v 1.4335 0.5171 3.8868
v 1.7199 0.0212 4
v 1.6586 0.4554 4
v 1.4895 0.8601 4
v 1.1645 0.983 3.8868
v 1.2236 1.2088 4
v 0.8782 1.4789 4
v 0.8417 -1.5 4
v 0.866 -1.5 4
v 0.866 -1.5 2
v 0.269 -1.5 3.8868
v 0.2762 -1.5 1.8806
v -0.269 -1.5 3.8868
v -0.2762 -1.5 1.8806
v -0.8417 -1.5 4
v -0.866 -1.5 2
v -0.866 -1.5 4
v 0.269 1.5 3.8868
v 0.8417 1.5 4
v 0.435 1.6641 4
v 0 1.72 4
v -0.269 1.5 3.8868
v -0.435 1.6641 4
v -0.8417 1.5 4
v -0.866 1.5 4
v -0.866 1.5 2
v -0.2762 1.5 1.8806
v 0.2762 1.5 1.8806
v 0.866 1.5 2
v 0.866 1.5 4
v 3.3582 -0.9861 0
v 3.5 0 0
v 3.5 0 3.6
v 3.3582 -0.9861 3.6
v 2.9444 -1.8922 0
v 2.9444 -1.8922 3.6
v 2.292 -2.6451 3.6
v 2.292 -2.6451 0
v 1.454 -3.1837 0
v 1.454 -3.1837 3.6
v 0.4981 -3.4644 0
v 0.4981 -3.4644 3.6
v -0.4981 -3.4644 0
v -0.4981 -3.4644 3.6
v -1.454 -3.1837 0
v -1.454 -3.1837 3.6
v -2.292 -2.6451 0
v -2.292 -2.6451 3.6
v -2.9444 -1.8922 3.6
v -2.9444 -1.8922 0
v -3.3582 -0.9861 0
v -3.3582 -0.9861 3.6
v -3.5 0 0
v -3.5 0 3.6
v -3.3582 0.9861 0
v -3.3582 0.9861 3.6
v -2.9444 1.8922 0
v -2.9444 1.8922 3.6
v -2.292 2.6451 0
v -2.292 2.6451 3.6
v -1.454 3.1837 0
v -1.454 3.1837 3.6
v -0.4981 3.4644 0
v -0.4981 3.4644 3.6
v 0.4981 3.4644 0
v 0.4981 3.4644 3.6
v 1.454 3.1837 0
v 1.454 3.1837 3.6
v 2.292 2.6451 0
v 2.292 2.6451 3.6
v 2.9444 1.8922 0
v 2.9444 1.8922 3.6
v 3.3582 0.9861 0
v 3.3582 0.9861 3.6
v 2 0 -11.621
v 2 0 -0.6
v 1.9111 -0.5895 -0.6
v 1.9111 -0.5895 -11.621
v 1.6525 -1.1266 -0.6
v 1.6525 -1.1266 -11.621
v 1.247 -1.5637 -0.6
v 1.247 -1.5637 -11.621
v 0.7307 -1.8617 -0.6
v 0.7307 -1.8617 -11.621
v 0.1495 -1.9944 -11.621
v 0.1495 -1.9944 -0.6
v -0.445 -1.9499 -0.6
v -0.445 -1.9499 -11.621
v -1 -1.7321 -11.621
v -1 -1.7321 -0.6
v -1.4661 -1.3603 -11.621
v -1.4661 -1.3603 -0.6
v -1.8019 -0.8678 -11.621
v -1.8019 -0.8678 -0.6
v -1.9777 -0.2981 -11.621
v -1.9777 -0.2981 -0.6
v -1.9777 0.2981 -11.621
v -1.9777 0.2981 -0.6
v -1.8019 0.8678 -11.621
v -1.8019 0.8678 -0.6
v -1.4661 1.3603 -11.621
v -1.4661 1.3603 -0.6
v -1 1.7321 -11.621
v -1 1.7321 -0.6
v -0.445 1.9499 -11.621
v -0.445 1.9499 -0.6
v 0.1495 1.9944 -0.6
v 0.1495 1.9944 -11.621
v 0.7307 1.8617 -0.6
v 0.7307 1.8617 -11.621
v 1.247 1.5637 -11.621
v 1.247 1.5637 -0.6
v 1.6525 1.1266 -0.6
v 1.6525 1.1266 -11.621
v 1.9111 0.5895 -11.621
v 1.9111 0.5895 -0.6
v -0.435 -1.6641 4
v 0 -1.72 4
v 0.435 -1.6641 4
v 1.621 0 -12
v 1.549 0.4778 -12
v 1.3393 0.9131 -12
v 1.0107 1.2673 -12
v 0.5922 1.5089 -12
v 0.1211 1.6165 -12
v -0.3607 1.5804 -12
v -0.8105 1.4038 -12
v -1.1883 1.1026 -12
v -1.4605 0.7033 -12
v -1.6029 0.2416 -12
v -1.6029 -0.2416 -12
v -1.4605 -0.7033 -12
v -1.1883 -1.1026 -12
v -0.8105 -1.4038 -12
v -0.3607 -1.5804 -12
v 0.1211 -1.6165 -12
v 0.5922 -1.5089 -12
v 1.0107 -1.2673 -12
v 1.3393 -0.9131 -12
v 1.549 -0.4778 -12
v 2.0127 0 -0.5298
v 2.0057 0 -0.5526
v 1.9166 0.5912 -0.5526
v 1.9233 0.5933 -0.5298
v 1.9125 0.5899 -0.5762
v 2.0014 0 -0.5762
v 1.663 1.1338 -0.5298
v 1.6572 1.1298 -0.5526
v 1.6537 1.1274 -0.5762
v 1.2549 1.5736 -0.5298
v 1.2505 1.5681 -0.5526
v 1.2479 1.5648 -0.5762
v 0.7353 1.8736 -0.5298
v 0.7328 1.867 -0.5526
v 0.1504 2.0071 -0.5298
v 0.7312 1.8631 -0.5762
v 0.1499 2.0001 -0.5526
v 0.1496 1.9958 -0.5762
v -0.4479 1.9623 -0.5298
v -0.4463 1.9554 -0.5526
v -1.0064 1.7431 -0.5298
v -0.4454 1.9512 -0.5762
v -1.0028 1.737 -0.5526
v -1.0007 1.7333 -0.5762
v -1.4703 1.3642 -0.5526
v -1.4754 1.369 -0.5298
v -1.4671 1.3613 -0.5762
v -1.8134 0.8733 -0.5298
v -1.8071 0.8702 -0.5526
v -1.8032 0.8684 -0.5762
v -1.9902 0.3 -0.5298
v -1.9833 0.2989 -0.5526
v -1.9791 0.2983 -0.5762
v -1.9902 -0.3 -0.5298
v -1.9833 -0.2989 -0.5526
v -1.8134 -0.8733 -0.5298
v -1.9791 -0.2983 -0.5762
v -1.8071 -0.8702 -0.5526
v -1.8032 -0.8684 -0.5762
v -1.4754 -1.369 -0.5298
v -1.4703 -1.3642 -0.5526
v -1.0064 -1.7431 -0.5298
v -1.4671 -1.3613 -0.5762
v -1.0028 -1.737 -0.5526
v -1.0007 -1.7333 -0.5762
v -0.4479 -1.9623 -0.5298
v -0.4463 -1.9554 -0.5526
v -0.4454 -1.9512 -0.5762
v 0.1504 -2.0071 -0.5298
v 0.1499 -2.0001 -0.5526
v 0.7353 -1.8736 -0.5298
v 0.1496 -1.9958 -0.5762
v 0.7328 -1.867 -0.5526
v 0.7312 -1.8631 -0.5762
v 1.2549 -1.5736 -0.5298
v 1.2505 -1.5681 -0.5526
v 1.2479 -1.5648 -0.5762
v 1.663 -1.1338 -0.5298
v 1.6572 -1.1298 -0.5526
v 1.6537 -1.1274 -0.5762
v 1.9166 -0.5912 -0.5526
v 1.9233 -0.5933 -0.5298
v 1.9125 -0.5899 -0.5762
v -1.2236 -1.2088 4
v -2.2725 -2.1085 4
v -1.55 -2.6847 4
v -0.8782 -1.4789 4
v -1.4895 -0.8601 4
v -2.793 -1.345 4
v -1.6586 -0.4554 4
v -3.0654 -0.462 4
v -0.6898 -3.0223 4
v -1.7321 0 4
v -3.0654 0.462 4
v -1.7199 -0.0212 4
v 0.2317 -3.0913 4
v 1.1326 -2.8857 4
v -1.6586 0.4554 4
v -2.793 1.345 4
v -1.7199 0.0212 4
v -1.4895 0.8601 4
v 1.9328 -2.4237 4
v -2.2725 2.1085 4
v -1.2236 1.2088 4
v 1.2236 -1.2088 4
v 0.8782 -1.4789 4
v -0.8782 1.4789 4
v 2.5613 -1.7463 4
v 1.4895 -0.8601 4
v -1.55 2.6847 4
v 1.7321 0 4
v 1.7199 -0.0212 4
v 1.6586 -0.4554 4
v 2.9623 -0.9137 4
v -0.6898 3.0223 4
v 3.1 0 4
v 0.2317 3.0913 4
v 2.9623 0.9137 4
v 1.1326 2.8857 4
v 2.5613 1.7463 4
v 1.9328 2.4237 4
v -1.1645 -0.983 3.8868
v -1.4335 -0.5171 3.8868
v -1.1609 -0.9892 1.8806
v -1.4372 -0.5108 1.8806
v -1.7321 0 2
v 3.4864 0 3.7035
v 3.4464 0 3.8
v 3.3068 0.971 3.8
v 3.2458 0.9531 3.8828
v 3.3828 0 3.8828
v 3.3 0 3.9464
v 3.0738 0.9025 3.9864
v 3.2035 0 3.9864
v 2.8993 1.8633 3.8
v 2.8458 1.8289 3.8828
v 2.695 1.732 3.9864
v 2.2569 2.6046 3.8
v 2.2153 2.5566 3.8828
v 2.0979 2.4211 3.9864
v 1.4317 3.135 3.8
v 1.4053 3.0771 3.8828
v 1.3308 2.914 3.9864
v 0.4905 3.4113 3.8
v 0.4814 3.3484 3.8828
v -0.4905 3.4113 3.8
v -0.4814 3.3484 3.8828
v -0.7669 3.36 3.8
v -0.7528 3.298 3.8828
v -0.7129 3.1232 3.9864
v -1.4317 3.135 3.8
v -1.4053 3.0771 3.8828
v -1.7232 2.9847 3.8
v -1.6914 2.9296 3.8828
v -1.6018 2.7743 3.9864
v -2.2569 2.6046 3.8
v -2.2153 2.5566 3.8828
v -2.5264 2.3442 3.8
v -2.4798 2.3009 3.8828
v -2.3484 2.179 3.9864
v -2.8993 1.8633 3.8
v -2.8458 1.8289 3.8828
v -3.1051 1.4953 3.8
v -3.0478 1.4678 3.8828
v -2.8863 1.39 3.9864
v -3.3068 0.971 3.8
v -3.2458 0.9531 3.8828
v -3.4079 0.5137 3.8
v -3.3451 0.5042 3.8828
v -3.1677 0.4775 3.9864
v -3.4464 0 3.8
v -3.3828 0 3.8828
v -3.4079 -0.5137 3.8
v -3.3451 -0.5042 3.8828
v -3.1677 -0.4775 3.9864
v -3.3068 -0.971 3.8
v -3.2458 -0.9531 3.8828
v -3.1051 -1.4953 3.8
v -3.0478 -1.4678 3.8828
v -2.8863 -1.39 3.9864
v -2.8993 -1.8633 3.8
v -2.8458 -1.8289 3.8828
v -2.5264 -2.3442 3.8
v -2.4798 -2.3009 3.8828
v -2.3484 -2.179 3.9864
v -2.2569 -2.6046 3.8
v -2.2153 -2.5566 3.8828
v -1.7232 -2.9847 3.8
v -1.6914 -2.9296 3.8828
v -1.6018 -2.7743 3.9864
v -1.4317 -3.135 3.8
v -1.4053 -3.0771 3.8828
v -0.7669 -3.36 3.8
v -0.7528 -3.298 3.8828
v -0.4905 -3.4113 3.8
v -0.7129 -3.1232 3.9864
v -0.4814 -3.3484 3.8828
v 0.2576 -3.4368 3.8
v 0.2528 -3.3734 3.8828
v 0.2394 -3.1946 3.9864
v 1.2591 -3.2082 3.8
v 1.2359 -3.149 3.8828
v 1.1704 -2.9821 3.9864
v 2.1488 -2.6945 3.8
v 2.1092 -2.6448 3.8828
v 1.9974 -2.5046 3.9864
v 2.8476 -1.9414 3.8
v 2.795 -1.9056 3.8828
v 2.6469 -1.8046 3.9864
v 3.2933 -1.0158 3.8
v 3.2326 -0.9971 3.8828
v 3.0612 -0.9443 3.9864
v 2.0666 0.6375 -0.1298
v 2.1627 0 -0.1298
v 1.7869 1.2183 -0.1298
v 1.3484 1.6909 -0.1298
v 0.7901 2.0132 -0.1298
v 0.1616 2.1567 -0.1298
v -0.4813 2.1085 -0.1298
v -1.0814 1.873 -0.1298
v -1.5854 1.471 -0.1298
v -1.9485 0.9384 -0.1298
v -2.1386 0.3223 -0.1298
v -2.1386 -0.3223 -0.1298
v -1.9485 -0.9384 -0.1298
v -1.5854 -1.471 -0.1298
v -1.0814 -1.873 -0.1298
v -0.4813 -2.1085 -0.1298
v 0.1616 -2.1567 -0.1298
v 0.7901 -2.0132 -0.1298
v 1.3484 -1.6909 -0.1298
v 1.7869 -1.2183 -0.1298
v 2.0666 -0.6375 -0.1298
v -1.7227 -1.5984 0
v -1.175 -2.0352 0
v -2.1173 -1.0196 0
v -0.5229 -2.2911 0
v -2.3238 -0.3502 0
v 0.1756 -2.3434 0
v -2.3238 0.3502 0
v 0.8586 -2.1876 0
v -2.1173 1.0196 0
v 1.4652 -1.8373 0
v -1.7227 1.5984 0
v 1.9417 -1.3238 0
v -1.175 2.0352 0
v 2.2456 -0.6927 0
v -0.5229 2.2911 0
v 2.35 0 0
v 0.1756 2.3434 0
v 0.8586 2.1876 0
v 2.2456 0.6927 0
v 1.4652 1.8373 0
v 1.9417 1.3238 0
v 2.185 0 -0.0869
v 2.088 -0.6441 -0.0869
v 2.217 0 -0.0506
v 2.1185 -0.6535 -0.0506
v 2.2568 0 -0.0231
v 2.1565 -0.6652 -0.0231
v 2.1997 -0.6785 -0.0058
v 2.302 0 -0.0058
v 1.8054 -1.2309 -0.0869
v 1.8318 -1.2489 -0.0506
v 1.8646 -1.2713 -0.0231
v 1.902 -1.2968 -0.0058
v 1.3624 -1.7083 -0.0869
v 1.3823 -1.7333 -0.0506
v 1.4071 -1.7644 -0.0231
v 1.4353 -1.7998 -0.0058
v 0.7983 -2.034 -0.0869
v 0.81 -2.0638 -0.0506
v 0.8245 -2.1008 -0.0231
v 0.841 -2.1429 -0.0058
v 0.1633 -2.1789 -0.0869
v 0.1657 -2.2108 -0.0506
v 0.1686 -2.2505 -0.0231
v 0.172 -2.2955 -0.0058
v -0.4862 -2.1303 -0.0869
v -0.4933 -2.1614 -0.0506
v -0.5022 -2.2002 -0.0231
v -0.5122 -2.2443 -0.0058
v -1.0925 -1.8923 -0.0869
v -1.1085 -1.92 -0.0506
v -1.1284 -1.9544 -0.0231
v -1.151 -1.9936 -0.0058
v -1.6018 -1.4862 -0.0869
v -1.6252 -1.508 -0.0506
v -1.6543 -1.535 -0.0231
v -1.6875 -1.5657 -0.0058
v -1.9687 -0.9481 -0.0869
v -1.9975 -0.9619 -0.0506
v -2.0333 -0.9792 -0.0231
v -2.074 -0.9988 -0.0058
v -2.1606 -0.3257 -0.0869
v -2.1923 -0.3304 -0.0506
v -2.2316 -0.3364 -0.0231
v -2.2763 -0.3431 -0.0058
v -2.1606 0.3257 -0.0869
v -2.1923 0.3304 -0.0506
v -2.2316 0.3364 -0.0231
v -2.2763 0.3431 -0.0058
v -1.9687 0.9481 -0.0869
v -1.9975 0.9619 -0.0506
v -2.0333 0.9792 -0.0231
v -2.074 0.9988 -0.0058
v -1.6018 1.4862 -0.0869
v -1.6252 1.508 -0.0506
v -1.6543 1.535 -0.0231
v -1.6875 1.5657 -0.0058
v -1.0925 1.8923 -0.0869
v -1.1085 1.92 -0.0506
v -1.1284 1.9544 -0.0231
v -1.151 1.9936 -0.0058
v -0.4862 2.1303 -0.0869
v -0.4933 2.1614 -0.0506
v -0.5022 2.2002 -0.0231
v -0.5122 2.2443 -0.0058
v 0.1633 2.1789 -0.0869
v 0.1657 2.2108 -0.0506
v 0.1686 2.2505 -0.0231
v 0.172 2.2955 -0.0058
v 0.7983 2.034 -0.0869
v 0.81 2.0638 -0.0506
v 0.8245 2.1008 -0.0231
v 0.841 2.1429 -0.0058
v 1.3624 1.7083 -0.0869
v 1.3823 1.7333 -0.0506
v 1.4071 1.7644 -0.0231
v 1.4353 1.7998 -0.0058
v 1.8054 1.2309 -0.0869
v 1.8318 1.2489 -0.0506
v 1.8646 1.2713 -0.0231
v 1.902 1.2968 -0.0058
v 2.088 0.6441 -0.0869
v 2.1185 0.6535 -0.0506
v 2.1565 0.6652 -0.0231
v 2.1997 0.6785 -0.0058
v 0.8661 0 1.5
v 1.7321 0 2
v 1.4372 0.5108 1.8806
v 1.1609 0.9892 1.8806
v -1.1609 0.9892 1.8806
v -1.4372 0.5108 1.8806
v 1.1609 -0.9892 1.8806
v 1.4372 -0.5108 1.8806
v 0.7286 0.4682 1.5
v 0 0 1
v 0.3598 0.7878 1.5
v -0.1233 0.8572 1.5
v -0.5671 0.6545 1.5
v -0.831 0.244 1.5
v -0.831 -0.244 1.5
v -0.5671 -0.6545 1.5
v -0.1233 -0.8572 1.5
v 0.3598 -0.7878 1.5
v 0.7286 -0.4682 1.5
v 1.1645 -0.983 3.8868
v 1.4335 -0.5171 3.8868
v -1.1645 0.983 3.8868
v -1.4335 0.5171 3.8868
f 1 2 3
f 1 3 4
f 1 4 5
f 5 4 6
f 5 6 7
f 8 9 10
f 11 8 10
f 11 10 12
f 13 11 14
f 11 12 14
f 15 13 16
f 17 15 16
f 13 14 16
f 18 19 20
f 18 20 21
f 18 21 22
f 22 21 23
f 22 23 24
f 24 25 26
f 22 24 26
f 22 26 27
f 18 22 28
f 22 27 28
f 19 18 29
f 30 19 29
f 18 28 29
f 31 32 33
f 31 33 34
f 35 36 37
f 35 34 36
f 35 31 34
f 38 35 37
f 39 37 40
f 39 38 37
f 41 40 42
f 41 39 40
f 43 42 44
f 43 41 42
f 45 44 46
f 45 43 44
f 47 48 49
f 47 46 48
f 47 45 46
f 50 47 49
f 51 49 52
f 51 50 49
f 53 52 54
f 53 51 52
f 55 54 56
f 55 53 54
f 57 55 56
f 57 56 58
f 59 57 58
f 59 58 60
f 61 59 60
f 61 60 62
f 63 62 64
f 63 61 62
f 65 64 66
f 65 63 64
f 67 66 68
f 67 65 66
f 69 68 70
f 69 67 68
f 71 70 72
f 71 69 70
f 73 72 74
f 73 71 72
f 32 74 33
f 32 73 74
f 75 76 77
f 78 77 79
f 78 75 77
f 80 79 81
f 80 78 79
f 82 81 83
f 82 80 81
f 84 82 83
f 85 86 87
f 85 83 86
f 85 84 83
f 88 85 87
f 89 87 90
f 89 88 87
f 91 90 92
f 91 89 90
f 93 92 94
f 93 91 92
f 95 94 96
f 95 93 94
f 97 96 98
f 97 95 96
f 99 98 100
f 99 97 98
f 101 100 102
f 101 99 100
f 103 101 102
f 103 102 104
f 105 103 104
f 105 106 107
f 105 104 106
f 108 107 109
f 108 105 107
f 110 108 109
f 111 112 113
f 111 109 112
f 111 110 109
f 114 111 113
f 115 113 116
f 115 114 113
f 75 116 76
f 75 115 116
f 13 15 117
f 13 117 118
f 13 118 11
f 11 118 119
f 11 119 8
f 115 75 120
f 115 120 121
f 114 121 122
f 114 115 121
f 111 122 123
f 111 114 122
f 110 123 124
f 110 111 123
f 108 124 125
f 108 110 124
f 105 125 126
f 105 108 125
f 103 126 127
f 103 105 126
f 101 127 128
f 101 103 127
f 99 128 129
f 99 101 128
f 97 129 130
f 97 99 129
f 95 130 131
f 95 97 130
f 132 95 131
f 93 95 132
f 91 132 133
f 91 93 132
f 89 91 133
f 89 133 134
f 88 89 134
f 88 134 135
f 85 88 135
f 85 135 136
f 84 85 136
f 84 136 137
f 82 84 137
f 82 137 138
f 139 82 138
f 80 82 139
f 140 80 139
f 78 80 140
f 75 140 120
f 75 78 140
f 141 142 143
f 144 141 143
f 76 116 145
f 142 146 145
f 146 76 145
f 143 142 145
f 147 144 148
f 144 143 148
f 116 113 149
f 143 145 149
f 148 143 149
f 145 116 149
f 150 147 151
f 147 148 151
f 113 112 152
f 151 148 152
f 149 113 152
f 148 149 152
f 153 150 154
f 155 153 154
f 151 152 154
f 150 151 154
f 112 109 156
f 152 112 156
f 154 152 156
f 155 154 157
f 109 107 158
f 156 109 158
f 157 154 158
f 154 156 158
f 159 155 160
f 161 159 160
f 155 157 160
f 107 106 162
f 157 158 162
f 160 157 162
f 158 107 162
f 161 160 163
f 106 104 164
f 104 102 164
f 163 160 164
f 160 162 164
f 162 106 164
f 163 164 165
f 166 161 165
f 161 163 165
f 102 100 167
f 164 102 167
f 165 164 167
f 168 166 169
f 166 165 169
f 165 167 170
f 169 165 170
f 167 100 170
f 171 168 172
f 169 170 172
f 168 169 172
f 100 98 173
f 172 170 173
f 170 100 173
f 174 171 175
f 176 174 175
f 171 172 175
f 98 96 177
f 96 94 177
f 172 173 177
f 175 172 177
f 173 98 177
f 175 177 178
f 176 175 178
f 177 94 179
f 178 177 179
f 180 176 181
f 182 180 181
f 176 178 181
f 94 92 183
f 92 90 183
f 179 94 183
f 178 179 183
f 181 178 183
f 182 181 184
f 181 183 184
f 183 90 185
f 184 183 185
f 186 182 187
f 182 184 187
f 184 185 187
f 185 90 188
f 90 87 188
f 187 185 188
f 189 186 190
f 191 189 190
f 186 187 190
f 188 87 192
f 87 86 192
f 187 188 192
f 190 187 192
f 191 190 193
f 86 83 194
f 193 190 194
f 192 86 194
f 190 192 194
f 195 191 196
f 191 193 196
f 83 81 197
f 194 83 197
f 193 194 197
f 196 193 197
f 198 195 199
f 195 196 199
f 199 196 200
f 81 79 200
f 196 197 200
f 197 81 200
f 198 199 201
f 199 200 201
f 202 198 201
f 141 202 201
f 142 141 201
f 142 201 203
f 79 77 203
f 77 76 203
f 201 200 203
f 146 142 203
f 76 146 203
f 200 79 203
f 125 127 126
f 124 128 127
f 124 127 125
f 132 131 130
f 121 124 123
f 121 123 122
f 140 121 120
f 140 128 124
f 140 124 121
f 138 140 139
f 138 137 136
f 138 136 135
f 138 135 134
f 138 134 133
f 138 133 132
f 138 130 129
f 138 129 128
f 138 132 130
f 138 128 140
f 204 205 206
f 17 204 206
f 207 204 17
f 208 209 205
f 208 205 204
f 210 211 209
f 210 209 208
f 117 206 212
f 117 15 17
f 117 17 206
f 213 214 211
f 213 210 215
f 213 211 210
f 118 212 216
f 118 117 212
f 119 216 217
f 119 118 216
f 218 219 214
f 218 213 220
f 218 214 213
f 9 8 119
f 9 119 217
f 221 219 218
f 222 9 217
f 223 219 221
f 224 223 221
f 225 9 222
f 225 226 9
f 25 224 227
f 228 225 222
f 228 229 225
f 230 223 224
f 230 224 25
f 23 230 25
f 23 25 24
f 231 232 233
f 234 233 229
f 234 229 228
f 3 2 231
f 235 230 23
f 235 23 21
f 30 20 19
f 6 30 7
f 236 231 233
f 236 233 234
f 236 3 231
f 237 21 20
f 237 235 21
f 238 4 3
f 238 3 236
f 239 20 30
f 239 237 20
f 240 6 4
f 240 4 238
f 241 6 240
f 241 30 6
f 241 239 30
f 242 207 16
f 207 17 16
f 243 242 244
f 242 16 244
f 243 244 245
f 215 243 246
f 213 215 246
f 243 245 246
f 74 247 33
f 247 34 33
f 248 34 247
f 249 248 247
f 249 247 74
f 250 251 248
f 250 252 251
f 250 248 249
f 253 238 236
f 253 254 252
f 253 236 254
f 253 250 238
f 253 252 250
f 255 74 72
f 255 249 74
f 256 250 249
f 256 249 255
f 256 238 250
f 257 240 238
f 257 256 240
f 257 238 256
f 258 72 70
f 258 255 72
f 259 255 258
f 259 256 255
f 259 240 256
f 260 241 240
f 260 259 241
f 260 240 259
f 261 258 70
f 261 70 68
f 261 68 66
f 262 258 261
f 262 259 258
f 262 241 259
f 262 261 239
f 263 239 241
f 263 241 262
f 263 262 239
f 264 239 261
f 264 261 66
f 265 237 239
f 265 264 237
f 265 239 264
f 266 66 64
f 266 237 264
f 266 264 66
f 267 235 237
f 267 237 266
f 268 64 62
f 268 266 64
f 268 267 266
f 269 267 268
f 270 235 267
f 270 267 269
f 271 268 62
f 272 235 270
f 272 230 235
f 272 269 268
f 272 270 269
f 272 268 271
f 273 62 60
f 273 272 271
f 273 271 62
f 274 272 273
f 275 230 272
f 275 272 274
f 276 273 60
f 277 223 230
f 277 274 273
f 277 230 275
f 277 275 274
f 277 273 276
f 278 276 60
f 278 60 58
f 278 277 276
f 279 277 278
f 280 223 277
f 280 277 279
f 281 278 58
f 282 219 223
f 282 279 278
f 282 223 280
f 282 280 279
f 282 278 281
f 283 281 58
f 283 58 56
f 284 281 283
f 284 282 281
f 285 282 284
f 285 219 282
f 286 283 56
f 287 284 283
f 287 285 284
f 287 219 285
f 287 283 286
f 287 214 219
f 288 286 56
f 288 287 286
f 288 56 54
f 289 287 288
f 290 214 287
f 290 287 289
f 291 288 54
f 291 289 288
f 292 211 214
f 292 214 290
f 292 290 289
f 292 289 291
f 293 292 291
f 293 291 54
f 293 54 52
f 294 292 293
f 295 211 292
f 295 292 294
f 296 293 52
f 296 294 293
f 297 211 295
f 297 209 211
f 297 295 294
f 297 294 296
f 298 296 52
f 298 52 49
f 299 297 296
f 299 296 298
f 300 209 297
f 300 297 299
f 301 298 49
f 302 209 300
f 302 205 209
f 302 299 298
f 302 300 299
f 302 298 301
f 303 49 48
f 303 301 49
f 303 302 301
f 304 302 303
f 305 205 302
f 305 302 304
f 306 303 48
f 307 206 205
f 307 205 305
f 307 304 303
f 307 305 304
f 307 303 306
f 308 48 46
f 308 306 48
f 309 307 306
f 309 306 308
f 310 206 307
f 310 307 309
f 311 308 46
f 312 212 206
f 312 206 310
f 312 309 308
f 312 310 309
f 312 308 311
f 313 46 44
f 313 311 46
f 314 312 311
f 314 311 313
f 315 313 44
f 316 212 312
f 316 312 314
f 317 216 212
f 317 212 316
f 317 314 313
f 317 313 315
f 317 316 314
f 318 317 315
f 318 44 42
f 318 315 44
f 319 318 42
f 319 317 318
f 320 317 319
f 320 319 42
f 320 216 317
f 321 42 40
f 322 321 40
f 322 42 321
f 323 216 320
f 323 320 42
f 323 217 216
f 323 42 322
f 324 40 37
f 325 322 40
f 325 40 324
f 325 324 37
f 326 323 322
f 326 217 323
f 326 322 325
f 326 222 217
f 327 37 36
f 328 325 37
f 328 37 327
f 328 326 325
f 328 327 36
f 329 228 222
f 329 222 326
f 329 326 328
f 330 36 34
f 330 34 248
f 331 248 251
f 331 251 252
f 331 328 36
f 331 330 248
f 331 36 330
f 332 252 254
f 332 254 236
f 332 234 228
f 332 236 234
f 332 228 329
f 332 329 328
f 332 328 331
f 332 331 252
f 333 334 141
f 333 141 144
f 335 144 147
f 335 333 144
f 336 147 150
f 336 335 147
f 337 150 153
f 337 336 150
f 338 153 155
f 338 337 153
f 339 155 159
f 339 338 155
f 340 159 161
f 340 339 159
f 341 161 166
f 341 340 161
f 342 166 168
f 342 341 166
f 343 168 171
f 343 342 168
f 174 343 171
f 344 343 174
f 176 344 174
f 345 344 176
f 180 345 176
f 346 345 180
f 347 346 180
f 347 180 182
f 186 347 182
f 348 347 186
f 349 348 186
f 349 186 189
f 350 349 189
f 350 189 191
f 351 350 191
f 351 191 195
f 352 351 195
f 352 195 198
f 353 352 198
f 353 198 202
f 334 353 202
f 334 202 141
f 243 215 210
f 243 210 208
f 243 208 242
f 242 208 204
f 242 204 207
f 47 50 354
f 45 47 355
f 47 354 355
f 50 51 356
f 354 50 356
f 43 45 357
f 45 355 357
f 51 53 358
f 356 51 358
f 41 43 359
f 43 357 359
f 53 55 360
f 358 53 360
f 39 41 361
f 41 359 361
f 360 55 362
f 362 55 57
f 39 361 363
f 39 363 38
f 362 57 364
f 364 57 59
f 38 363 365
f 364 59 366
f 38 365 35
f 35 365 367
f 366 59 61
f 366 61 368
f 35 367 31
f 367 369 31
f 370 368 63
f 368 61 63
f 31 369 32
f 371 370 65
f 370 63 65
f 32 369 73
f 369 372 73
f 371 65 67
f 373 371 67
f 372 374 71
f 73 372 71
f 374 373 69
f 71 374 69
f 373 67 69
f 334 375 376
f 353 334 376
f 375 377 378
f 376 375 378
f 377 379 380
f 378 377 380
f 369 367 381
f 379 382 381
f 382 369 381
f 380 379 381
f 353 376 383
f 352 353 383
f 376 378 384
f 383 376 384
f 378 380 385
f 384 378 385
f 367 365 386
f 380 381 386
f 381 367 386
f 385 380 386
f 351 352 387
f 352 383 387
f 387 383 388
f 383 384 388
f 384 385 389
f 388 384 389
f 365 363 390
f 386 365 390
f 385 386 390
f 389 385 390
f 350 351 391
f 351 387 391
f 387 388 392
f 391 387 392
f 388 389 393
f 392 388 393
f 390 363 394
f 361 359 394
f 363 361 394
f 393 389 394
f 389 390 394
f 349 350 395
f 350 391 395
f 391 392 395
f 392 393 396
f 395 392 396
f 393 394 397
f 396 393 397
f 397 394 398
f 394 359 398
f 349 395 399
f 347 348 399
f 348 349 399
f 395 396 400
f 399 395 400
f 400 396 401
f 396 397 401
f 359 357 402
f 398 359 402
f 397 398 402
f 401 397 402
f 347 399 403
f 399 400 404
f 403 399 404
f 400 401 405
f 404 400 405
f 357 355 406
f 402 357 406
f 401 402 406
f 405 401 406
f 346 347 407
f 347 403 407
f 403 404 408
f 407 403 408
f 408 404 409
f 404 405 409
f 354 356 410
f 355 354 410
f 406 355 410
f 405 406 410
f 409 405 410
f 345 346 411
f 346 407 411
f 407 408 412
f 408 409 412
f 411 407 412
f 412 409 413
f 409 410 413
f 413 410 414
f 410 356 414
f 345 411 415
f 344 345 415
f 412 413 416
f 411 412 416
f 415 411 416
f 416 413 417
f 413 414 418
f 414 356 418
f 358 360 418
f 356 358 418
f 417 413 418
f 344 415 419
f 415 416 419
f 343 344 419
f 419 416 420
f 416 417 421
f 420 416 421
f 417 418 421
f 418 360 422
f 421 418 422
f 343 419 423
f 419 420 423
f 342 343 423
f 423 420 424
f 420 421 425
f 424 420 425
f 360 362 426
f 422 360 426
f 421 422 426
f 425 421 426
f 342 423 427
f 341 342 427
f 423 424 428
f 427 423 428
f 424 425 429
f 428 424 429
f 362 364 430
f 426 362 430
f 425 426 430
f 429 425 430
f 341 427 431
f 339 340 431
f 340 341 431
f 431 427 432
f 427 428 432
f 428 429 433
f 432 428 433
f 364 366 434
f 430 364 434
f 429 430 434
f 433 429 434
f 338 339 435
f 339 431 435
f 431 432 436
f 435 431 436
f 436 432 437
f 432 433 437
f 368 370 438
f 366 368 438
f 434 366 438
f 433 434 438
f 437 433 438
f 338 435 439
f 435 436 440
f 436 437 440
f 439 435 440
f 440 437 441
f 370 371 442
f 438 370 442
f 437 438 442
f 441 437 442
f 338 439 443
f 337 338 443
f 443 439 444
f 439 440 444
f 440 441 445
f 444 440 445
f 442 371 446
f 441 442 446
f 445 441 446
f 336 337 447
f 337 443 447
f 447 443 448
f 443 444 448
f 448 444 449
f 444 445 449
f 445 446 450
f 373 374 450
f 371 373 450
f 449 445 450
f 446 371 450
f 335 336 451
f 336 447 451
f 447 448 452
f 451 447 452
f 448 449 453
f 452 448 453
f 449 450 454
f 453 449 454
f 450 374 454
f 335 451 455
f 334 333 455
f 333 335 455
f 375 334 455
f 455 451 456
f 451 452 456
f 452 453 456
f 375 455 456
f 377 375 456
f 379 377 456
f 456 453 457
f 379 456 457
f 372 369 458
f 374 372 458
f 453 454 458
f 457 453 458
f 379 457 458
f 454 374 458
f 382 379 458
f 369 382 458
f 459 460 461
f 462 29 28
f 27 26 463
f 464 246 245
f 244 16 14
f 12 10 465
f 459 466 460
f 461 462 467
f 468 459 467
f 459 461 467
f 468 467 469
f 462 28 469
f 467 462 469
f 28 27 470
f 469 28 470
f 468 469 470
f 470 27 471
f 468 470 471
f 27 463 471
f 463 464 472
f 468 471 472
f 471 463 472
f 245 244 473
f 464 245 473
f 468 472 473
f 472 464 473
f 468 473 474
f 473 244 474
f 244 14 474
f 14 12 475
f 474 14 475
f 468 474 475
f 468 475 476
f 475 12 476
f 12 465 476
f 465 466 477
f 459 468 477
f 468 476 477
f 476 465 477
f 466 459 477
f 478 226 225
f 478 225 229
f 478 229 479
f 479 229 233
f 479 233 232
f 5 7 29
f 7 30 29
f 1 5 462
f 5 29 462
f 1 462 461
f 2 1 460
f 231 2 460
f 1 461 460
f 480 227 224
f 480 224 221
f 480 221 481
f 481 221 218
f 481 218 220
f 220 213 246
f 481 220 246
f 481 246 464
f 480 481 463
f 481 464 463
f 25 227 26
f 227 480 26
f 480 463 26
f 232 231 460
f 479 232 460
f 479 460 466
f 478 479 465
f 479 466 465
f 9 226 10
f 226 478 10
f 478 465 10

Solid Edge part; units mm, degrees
sketch "Sketch1" plane through (0, 0, 0) normal (0, 0, 1) x (1, 0, 0)
  line L0 (-0.866, 1.5) -> (0.866, 1.5)
  line L1 (0.866, 1.5) -> (1.7321, 0)
  line L2 (1.7321, 0) -> (0.866, -1.5)
  line L3 (0.866, -1.5) -> (-0.866, -1.5)
  line L4 (-0.866, -1.5) -> (-1.7321, 0)
  line L5 (-1.7321, 0) -> (-0.866, 1.5)
  circle A0 centre (0, 0) radius 3.5
  dimension "D1" = 7
  dimension "D2" = 3
extrude "Protrusion1" add sketch "Sketch1" along normal blind 4
sketch "Sketch2" plane through (0, 0, 0) normal (0, -1, 0) x (1, 0, 0)
  line L0 (0, 1) -> (1.7321, 2)
  line L1 (1.7321, 2) -> (3.5, 2)
  line L2 (3.5, 2) -> (3.5, 0)
  line L3 (3.5, 0) -> (2, 0)
  line L4 (2, 0) -> (2, -0.6)
  line L5 (2, -0.6) -> (2, -0.601) construction
  line L6 (2, -0.601) -> (2, -0.601) construction
  line L7 (2, -0.601) -> (2, -12)
  line L8 (0, -12) -> (2, -12)
  dimension "D1" = 11.399
  dimension "D2" = 2
  dimension "D3" = 2
  dimension "D4" = 3.5
  dimension "D5" = 2
  dimension "D6" = 14
  dimension "D7" = 0.001
  dimension "D8" = 1.5
  dimension "D9" = 1.5
revolve "RevolvedProtrusion_1" add sketch "Sketch2" angle 360 about axis through (0, 0, 2.3333) along (0, 0, -1)
cosmetic_thread "Thread_1" size "M4" thread depth 11.398
sketch "Sketch3" plane through (0, 0, 0) normal (0, -1, 0) x (1, 0, 0)
  line L0 (0, 5) -> (1.72, 5)
  line L1 (1.72, 5) -> (1.72, 4)
  line L2 (1.72, 4) -> (0, 3.007)
  dimension "D1" = 1.72
  dimension "D2" = 1
  dimension "D3" = 5
revolve "RevolvedCutout_1" cut sketch "Sketch3" angle 360 about axis through (0, 0, 7.1999) along (0, 0, 1)
fillet "Round_1" radius 0.4 1 edges at (-3.5, 0, 4)
sketch "Sketch4" plane through (0, 0, 0) normal (0, -1, 0) x (1, 0, 0)
  line L0 (2, 0) -> (2.35, 0)
  arc A0 (2.1627, -0.1298) -> (2.35, 0) centre (2.35, -0.2) cw
  line L1 (2.0127, -0.5298) -> (2.1627, -0.1298)
  arc A1 (2.0127, -0.5298) -> (2, -0.6) centre (2.2, -0.6) ccw
  line L2 (2, 0) -> (2, -0.6)
  dimension "D1" = 0.6
  dimension "D2" = 2
  dimension "D3" = 0.6
  dimension "D4" = 0.35
  dimension "D5" = 0.2
revolve "RevolvedProtrusion_2" add sketch "Sketch4" angle 360 about axis through (0, 0, -1.02) along (0, 0, 1)
chamfer "Chamfer_1" distance 0.379 angle 45 1 edges at (-2, 0, -12)
properties material "Acier"
